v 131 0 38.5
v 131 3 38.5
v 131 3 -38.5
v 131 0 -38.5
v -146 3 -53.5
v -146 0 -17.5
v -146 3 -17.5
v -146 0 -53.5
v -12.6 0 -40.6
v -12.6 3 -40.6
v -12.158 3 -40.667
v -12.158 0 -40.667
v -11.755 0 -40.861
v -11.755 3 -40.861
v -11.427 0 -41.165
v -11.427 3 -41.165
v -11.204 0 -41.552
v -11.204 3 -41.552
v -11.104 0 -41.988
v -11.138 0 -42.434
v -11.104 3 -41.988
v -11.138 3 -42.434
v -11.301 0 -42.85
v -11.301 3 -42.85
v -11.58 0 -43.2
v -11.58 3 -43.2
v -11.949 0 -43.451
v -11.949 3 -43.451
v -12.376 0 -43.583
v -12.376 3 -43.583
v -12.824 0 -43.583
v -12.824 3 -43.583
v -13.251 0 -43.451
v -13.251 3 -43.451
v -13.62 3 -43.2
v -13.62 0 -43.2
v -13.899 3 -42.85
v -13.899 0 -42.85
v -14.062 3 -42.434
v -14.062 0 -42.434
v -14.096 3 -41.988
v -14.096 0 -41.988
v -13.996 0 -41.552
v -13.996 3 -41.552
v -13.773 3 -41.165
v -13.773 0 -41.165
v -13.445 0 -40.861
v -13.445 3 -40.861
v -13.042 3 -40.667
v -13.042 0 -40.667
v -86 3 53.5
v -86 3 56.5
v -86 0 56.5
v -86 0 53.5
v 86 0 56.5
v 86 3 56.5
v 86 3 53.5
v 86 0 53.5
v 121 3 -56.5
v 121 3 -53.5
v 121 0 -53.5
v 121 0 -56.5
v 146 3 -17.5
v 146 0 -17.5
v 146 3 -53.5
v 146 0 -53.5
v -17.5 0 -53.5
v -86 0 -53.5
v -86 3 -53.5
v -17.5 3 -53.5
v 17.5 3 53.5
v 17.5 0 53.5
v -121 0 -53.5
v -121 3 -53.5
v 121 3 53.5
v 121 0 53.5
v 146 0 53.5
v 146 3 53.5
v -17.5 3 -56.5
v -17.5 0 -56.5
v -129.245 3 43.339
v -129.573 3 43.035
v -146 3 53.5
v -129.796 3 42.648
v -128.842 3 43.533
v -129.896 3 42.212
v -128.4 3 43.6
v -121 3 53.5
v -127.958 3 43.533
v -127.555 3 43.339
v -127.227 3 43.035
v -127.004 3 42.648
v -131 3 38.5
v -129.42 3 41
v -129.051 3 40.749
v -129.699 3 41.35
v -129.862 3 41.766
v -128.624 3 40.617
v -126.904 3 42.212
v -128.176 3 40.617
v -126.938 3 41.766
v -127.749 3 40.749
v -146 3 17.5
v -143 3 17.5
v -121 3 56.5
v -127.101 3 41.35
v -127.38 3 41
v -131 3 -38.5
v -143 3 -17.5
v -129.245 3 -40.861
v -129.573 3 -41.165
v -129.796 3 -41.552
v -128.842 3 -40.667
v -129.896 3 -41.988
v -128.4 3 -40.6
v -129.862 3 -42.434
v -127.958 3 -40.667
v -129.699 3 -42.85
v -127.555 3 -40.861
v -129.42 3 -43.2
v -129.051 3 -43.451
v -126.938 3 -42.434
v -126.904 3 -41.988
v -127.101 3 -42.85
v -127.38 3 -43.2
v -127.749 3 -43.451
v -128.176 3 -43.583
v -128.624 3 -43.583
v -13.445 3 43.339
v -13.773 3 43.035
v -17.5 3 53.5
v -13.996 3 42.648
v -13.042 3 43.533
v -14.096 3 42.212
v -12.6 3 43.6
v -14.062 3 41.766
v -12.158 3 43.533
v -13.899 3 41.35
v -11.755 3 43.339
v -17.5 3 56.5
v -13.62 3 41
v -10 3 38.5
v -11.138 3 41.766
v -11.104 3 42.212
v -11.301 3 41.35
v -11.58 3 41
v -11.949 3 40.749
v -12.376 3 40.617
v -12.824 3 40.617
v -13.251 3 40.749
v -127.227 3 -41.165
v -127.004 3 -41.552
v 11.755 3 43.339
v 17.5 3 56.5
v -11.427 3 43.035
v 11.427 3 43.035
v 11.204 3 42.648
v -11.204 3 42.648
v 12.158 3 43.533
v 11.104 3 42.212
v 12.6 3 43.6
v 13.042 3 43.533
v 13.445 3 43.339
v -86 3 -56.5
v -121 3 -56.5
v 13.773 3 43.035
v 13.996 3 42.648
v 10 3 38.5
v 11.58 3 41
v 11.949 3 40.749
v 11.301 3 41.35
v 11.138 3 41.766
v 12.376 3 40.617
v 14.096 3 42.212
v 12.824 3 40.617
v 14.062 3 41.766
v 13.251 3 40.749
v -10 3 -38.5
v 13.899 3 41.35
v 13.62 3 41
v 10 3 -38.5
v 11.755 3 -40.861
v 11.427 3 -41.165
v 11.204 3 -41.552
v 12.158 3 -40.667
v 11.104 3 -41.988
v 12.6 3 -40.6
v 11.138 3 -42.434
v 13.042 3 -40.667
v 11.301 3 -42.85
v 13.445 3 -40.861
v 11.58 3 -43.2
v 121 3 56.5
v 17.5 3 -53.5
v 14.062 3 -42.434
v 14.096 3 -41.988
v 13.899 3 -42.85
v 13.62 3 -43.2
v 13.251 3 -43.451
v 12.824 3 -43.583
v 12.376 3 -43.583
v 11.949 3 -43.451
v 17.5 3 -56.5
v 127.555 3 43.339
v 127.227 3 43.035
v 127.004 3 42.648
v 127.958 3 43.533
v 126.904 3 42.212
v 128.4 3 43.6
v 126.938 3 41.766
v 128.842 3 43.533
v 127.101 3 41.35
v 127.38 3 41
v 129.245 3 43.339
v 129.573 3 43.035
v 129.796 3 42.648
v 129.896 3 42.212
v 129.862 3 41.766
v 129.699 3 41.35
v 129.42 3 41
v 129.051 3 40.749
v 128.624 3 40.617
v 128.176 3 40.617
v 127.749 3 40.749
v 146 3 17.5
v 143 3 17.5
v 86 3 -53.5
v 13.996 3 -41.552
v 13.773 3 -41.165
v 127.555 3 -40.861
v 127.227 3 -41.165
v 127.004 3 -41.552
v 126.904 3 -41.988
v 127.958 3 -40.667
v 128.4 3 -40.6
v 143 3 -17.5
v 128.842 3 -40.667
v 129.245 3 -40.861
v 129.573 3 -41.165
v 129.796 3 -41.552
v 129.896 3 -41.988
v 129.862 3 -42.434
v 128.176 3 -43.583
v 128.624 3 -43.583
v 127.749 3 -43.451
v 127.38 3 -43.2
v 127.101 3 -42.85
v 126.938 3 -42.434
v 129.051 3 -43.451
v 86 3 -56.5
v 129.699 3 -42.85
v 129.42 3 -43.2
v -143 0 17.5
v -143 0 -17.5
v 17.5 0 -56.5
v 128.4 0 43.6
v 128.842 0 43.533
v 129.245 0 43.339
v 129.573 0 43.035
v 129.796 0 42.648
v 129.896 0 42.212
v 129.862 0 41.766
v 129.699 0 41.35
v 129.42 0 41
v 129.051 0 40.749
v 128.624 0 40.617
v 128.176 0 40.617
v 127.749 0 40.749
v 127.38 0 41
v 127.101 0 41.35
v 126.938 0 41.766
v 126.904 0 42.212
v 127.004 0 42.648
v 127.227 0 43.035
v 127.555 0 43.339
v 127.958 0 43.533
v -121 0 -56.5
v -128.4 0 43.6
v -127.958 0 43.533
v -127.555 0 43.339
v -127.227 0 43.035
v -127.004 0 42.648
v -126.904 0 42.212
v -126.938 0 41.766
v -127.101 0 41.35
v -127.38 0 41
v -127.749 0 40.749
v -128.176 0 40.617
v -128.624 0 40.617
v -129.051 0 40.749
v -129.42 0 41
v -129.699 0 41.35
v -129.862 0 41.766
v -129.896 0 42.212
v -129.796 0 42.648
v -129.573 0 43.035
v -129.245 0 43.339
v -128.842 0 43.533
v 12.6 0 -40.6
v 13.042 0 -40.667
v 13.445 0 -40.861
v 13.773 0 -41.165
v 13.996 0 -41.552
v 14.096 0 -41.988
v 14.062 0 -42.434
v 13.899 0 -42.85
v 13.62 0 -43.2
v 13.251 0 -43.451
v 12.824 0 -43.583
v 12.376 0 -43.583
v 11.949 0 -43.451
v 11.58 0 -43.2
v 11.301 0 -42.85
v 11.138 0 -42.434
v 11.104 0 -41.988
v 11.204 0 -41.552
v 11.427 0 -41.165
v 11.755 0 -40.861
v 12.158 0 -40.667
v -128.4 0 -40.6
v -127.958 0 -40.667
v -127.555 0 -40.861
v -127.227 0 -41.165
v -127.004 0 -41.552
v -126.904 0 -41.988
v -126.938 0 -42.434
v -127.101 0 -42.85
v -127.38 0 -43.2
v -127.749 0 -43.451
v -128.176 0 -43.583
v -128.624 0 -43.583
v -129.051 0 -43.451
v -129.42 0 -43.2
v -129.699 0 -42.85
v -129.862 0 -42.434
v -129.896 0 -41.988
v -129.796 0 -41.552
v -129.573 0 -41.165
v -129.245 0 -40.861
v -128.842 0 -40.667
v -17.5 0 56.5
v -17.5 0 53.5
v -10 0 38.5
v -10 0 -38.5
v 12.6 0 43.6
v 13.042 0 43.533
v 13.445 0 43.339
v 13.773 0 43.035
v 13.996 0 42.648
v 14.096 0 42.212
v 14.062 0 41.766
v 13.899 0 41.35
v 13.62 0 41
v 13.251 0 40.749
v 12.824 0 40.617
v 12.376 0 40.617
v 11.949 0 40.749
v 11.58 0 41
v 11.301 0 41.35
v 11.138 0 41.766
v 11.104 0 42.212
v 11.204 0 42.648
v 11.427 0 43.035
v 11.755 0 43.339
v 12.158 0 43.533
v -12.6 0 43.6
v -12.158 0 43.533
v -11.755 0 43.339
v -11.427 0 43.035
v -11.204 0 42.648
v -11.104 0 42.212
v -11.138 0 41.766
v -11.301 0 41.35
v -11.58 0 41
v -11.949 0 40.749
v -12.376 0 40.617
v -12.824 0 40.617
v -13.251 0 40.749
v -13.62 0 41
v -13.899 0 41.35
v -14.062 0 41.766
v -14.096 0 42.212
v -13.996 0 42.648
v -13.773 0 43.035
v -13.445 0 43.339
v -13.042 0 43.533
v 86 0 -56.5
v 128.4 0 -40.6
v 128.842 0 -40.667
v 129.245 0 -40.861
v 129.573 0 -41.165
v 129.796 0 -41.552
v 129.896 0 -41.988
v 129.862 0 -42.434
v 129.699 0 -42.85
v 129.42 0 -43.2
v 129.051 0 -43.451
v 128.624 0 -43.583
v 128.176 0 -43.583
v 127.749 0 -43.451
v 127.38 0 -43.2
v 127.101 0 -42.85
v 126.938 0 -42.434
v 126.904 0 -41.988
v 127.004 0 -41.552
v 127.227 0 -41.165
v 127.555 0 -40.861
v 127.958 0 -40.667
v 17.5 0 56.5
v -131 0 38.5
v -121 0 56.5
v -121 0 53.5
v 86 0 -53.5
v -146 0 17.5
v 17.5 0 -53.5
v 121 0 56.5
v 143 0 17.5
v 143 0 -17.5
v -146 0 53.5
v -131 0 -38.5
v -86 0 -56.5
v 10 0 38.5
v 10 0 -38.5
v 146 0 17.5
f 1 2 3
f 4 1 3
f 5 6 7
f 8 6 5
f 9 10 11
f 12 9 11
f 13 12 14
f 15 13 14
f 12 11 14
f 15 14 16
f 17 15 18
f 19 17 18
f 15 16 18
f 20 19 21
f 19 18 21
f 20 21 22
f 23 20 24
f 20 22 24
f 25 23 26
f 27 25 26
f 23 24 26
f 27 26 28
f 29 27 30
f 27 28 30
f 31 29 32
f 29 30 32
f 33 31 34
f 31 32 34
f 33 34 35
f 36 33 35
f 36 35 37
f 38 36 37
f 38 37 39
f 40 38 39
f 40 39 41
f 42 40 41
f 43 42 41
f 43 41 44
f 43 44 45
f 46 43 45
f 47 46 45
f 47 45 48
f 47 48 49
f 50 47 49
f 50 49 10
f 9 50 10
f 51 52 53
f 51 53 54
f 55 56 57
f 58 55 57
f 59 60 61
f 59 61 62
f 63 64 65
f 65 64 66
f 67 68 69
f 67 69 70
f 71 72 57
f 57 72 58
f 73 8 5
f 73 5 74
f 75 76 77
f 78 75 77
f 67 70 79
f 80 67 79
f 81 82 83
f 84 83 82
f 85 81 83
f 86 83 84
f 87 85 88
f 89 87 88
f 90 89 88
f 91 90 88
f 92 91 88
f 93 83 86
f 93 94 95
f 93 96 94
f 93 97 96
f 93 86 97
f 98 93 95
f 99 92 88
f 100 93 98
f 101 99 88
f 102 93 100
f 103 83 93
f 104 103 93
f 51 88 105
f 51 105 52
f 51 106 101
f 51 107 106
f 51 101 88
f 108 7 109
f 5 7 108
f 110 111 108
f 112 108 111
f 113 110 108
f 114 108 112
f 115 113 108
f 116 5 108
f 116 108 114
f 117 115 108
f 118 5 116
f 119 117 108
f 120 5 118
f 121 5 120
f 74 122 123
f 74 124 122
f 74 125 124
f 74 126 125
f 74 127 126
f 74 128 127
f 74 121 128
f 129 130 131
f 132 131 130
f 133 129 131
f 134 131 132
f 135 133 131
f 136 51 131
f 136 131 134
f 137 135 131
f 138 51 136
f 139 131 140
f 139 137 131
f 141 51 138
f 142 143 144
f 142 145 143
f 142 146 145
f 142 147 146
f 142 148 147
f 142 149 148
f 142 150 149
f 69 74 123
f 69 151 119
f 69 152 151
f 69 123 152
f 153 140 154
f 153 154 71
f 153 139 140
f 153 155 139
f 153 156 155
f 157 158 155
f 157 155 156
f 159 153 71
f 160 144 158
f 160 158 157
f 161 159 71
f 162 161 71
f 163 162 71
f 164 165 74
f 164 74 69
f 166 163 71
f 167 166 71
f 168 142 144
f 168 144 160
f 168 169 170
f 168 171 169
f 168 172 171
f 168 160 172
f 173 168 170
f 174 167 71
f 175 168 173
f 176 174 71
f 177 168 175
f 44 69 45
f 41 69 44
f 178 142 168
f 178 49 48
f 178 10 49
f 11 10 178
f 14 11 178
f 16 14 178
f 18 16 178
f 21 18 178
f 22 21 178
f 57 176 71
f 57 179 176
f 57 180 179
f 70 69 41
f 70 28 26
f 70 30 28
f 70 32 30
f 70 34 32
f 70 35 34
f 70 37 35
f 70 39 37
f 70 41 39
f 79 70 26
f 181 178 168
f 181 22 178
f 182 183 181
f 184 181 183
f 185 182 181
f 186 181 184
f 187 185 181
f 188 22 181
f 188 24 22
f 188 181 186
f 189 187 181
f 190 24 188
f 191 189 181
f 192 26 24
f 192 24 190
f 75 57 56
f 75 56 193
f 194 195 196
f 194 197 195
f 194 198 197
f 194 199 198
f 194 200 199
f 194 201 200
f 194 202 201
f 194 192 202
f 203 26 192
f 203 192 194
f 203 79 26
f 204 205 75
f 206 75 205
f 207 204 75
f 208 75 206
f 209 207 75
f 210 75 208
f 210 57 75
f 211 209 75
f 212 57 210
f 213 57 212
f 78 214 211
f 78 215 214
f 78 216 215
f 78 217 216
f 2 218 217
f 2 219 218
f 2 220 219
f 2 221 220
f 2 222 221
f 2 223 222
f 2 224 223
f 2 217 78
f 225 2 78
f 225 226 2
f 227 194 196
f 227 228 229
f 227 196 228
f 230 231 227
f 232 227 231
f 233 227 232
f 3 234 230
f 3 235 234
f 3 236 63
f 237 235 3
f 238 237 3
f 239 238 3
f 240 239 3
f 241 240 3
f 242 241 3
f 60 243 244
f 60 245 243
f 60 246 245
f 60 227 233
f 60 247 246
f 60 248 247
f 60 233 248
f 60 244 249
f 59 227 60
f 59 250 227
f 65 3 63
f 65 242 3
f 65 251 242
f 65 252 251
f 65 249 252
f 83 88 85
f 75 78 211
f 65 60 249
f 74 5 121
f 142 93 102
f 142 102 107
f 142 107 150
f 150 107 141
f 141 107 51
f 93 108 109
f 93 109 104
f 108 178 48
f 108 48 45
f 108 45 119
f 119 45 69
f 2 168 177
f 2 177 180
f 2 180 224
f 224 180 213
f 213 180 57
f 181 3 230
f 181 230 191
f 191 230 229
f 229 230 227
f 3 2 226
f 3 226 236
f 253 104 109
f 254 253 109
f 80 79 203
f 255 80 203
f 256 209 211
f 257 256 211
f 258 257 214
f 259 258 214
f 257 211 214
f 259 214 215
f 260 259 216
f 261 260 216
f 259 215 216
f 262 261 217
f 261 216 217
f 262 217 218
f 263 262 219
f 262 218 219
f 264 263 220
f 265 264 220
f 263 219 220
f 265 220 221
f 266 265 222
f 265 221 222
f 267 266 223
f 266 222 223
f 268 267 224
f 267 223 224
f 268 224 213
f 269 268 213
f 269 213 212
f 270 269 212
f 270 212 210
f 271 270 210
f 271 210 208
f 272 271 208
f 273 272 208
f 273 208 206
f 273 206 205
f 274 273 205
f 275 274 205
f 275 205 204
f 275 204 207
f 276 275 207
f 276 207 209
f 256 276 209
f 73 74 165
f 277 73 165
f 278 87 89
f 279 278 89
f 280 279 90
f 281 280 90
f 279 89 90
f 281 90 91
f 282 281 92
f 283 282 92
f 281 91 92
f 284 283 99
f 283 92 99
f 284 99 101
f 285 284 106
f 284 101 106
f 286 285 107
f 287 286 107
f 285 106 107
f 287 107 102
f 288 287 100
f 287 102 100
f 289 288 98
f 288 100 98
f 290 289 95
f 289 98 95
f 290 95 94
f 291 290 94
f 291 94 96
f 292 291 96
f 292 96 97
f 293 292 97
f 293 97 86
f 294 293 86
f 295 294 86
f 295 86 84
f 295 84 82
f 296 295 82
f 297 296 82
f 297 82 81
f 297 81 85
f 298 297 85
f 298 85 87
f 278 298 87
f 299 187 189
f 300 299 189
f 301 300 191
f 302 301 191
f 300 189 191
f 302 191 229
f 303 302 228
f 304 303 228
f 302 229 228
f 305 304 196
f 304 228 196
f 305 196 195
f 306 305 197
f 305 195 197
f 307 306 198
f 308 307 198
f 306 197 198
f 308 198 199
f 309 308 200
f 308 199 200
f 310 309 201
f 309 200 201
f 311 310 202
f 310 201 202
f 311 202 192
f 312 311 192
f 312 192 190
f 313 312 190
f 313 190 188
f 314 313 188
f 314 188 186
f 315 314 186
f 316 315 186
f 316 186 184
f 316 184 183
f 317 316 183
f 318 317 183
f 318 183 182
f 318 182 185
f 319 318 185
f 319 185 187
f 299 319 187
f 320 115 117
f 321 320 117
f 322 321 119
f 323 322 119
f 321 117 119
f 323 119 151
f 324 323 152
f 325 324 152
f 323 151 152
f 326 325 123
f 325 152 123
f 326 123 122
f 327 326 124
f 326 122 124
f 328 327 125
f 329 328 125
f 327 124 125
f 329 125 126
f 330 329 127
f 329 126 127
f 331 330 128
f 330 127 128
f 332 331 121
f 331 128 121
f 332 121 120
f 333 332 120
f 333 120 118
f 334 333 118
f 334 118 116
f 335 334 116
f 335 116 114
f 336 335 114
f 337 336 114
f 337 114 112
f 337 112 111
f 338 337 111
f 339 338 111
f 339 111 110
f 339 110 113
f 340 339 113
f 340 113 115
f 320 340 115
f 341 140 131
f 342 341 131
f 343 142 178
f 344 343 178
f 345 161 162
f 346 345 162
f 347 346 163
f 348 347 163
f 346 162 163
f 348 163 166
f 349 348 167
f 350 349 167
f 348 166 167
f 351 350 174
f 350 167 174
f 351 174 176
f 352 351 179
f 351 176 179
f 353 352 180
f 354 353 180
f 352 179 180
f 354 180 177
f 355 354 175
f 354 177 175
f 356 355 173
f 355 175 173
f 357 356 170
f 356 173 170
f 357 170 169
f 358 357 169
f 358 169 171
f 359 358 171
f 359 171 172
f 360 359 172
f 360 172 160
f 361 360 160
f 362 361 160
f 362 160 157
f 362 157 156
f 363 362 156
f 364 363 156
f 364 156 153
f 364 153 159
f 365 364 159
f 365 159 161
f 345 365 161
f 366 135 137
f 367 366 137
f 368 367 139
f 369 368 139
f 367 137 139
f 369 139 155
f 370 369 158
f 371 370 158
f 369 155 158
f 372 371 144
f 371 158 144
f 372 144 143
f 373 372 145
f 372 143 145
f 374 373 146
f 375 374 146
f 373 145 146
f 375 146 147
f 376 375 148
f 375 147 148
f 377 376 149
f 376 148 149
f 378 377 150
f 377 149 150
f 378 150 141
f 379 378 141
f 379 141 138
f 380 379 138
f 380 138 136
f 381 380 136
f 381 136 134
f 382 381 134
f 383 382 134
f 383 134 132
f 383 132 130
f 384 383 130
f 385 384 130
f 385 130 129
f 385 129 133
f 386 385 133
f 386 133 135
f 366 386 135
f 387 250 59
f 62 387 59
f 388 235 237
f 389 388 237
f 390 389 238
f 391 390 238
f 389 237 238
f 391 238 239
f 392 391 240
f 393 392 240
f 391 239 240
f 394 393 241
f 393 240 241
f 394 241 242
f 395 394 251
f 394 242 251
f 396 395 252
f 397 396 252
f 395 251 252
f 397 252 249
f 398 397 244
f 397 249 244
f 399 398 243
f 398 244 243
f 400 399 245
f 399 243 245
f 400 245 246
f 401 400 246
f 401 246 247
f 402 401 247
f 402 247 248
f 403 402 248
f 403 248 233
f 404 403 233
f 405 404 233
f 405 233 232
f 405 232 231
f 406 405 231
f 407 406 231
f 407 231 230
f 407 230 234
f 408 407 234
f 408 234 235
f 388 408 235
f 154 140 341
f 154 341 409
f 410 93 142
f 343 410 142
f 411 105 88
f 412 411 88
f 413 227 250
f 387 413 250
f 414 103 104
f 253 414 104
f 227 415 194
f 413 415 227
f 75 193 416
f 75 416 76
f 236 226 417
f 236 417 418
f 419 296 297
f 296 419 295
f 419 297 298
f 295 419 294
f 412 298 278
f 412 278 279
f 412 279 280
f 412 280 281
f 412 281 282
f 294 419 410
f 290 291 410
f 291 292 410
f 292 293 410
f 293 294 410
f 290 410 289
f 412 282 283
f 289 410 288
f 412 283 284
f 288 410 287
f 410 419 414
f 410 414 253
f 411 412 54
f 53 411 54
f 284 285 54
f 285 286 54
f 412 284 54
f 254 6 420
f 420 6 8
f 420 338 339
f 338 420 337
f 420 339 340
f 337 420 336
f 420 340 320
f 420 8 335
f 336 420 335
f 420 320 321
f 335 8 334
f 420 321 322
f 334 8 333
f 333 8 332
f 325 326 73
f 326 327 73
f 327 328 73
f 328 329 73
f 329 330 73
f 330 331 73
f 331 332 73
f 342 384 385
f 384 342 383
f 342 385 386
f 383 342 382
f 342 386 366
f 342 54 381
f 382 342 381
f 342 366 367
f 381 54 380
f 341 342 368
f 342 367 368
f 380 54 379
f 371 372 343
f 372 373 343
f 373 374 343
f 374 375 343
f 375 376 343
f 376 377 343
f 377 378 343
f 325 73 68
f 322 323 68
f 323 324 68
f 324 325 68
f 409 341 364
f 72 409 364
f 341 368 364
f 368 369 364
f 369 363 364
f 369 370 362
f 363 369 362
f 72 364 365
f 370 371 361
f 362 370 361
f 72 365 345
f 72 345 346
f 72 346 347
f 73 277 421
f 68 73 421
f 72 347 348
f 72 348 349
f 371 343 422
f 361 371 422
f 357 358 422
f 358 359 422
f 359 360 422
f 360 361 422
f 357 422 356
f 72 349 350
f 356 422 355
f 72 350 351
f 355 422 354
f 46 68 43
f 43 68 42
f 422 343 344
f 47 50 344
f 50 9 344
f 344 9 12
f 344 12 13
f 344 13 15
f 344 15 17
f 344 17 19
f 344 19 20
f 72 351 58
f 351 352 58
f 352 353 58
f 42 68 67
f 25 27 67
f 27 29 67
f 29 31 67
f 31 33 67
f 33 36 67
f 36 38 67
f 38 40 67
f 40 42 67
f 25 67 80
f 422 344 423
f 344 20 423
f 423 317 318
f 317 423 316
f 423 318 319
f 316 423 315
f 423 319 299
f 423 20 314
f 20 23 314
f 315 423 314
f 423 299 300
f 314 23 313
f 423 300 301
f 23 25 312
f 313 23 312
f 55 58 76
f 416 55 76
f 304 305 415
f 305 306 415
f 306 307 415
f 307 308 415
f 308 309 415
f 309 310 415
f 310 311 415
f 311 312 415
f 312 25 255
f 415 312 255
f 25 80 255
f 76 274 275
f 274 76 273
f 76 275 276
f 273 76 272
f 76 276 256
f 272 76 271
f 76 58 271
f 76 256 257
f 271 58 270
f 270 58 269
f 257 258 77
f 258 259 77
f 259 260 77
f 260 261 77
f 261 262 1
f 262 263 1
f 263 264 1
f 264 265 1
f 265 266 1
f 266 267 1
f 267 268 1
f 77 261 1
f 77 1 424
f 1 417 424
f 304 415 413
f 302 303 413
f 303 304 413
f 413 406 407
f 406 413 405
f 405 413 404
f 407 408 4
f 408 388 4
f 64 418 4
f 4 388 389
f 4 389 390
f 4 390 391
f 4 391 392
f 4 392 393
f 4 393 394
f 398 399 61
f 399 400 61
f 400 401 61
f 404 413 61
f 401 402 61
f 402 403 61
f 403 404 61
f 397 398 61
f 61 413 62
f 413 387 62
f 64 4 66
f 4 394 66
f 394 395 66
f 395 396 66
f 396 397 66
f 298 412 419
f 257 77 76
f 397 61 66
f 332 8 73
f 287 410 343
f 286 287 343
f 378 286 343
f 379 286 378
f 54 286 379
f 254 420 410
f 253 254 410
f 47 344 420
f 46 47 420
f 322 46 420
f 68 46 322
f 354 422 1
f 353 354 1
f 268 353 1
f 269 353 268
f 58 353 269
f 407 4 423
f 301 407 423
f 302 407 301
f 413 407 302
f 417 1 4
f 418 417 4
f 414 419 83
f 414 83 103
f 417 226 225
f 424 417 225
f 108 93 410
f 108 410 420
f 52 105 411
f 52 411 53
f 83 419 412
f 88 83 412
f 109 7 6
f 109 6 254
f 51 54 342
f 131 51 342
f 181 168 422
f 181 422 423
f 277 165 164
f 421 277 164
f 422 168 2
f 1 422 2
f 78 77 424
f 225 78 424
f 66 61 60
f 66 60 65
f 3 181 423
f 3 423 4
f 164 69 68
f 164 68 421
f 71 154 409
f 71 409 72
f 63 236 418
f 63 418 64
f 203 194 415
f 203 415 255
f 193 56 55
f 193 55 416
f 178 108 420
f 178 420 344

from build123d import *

# Parameters (mm, degrees)
SKETCH1_W           = 292
SKETCH1_H           = 107
BOSS_EXTRUDE1_DEPTH = 3
SKETCH2_W           = 121
SKETCH2_H           = 77
CUT_EXTRUDE2_DEPTH  = 3
SKETCH3_W           = 121
SKETCH3_H           = 77
CUT_EXTRUDE3_DEPTH  = 3
SKETCH8_W           = 3
SKETCH8_H           = 35
CUT_EXTRUDE7_DEPTH  = 3
SKETCH4_W           = 35
SKETCH4_H           = 3
BOSS_EXTRUDE2_DEPTH = 3
SKETCH7_W           = 35
SKETCH7_H           = 3
BOSS_EXTRUDE3_DEPTH = 3
SKETCH9_R           = 1.5
CUT_EXTRUDE8_DEPTH  = 10


with BuildPart() as part:
    # Sketch1 → Boss-Extrude1 (new body)
    with BuildSketch(Plane(origin=(0, 0, 0), x_dir=(1, 0, 0), z_dir=(0, 1, 0))):
        Rectangle(SKETCH1_W, SKETCH1_H)
    extrude(amount=BOSS_EXTRUDE1_DEPTH)

    # Sketch2 → Cut-Extrude2 (cut)
    with BuildSketch(Plane(origin=(0, 3, 0), x_dir=(1, 0, 0), z_dir=(0, 1, 0))):
        with Locations((-70.5, 0)):
            Rectangle(SKETCH2_W, SKETCH2_H)
    extrude(amount=-CUT_EXTRUDE2_DEPTH, mode=Mode.SUBTRACT)

    # Sketch3 → Cut-Extrude3 (cut)
    with BuildSketch(Plane(origin=(0, 3, 0), x_dir=(1, 0, 0), z_dir=(0, 1, 0))):
        with Locations((70.5, 0)):
            Rectangle(SKETCH3_W, SKETCH3_H)
    extrude(amount=-CUT_EXTRUDE3_DEPTH, mode=Mode.SUBTRACT)

    # Sketch8 → Cut-Extrude7 (cut)
    with BuildSketch(Plane(origin=(0, 3, 0), x_dir=(1, 0, 0), z_dir=(0, 1, 0))):
        with Locations((144.5, 0)):
            Rectangle(SKETCH8_W, SKETCH8_H)
        with Locations((-144.5, 0)):
            Rectangle(SKETCH8_W, SKETCH8_H)
    extrude(amount=-CUT_EXTRUDE7_DEPTH, mode=Mode.SUBTRACT)

    # Sketch4 → Boss-Extrude2 (add)
    with BuildSketch(Plane(origin=(0, 3, 0), x_dir=(1, 0, 0), z_dir=(0, 1, 0))):
        with Locations((-103.5, -55)):
            Rectangle(SKETCH4_W, SKETCH4_H)
        with Locations((-103.5, 55)):
            Rectangle(SKETCH4_W, SKETCH4_H)
        with Locations((103.5, 55)):
            Rectangle(SKETCH4_W, SKETCH4_H)
        with Locations((103.5, -55)):
            Rectangle(SKETCH4_W, SKETCH4_H)
    extrude(amount=-BOSS_EXTRUDE2_DEPTH)

    # Sketch7 → Boss-Extrude3 (add)
    with BuildSketch(Plane(origin=(0, 3, 0), x_dir=(1, 0, 0), z_dir=(0, 1, 0))):
        with Locations((0, -55)):
            Rectangle(SKETCH7_W, SKETCH7_H)
        with Locations((0, 55)):
            Rectangle(SKETCH7_W, SKETCH7_H)
    extrude(amount=-BOSS_EXTRUDE3_DEPTH)

    # Sketch9 → Cut-Extrude8 (cut)
    with BuildSketch(Plane(origin=(0, 3, 0), x_dir=(1, 0, 0), z_dir=(0, 1, 0))):
        with Locations(Location((-128.4, -42.1, 0), (0, 0, 270))):
            Circle(SKETCH9_R)
        with Locations(Location((-12.6, -42.1, 0), (0, 0, 270))):
            Circle(SKETCH9_R)
        with Locations(Location((-12.6, 42.1, 0), (0, 0, 270))):
            Circle(SKETCH9_R)
        with Locations(Location((-128.4, 42.1, 0), (0, 0, 270))):
            Circle(SKETCH9_R)
        with Locations(Location((12.6, -42.1, 0), (0, 0, 270))):
            Circle(SKETCH9_R)
        with Locations(Location((128.4, -42.1, 0), (0, 0, 270))):
            Circle(SKETCH9_R)
        with Locations(Location((128.4, 42.1, 0), (0, 0, 270))):
            Circle(SKETCH9_R)
        with Locations(Location((12.6, 42.1, 0), (0, 0, 270))):
            Circle(SKETCH9_R)
    extrude(amount=-CUT_EXTRUDE8_DEPTH, mode=Mode.SUBTRACT)


solid = part.part
